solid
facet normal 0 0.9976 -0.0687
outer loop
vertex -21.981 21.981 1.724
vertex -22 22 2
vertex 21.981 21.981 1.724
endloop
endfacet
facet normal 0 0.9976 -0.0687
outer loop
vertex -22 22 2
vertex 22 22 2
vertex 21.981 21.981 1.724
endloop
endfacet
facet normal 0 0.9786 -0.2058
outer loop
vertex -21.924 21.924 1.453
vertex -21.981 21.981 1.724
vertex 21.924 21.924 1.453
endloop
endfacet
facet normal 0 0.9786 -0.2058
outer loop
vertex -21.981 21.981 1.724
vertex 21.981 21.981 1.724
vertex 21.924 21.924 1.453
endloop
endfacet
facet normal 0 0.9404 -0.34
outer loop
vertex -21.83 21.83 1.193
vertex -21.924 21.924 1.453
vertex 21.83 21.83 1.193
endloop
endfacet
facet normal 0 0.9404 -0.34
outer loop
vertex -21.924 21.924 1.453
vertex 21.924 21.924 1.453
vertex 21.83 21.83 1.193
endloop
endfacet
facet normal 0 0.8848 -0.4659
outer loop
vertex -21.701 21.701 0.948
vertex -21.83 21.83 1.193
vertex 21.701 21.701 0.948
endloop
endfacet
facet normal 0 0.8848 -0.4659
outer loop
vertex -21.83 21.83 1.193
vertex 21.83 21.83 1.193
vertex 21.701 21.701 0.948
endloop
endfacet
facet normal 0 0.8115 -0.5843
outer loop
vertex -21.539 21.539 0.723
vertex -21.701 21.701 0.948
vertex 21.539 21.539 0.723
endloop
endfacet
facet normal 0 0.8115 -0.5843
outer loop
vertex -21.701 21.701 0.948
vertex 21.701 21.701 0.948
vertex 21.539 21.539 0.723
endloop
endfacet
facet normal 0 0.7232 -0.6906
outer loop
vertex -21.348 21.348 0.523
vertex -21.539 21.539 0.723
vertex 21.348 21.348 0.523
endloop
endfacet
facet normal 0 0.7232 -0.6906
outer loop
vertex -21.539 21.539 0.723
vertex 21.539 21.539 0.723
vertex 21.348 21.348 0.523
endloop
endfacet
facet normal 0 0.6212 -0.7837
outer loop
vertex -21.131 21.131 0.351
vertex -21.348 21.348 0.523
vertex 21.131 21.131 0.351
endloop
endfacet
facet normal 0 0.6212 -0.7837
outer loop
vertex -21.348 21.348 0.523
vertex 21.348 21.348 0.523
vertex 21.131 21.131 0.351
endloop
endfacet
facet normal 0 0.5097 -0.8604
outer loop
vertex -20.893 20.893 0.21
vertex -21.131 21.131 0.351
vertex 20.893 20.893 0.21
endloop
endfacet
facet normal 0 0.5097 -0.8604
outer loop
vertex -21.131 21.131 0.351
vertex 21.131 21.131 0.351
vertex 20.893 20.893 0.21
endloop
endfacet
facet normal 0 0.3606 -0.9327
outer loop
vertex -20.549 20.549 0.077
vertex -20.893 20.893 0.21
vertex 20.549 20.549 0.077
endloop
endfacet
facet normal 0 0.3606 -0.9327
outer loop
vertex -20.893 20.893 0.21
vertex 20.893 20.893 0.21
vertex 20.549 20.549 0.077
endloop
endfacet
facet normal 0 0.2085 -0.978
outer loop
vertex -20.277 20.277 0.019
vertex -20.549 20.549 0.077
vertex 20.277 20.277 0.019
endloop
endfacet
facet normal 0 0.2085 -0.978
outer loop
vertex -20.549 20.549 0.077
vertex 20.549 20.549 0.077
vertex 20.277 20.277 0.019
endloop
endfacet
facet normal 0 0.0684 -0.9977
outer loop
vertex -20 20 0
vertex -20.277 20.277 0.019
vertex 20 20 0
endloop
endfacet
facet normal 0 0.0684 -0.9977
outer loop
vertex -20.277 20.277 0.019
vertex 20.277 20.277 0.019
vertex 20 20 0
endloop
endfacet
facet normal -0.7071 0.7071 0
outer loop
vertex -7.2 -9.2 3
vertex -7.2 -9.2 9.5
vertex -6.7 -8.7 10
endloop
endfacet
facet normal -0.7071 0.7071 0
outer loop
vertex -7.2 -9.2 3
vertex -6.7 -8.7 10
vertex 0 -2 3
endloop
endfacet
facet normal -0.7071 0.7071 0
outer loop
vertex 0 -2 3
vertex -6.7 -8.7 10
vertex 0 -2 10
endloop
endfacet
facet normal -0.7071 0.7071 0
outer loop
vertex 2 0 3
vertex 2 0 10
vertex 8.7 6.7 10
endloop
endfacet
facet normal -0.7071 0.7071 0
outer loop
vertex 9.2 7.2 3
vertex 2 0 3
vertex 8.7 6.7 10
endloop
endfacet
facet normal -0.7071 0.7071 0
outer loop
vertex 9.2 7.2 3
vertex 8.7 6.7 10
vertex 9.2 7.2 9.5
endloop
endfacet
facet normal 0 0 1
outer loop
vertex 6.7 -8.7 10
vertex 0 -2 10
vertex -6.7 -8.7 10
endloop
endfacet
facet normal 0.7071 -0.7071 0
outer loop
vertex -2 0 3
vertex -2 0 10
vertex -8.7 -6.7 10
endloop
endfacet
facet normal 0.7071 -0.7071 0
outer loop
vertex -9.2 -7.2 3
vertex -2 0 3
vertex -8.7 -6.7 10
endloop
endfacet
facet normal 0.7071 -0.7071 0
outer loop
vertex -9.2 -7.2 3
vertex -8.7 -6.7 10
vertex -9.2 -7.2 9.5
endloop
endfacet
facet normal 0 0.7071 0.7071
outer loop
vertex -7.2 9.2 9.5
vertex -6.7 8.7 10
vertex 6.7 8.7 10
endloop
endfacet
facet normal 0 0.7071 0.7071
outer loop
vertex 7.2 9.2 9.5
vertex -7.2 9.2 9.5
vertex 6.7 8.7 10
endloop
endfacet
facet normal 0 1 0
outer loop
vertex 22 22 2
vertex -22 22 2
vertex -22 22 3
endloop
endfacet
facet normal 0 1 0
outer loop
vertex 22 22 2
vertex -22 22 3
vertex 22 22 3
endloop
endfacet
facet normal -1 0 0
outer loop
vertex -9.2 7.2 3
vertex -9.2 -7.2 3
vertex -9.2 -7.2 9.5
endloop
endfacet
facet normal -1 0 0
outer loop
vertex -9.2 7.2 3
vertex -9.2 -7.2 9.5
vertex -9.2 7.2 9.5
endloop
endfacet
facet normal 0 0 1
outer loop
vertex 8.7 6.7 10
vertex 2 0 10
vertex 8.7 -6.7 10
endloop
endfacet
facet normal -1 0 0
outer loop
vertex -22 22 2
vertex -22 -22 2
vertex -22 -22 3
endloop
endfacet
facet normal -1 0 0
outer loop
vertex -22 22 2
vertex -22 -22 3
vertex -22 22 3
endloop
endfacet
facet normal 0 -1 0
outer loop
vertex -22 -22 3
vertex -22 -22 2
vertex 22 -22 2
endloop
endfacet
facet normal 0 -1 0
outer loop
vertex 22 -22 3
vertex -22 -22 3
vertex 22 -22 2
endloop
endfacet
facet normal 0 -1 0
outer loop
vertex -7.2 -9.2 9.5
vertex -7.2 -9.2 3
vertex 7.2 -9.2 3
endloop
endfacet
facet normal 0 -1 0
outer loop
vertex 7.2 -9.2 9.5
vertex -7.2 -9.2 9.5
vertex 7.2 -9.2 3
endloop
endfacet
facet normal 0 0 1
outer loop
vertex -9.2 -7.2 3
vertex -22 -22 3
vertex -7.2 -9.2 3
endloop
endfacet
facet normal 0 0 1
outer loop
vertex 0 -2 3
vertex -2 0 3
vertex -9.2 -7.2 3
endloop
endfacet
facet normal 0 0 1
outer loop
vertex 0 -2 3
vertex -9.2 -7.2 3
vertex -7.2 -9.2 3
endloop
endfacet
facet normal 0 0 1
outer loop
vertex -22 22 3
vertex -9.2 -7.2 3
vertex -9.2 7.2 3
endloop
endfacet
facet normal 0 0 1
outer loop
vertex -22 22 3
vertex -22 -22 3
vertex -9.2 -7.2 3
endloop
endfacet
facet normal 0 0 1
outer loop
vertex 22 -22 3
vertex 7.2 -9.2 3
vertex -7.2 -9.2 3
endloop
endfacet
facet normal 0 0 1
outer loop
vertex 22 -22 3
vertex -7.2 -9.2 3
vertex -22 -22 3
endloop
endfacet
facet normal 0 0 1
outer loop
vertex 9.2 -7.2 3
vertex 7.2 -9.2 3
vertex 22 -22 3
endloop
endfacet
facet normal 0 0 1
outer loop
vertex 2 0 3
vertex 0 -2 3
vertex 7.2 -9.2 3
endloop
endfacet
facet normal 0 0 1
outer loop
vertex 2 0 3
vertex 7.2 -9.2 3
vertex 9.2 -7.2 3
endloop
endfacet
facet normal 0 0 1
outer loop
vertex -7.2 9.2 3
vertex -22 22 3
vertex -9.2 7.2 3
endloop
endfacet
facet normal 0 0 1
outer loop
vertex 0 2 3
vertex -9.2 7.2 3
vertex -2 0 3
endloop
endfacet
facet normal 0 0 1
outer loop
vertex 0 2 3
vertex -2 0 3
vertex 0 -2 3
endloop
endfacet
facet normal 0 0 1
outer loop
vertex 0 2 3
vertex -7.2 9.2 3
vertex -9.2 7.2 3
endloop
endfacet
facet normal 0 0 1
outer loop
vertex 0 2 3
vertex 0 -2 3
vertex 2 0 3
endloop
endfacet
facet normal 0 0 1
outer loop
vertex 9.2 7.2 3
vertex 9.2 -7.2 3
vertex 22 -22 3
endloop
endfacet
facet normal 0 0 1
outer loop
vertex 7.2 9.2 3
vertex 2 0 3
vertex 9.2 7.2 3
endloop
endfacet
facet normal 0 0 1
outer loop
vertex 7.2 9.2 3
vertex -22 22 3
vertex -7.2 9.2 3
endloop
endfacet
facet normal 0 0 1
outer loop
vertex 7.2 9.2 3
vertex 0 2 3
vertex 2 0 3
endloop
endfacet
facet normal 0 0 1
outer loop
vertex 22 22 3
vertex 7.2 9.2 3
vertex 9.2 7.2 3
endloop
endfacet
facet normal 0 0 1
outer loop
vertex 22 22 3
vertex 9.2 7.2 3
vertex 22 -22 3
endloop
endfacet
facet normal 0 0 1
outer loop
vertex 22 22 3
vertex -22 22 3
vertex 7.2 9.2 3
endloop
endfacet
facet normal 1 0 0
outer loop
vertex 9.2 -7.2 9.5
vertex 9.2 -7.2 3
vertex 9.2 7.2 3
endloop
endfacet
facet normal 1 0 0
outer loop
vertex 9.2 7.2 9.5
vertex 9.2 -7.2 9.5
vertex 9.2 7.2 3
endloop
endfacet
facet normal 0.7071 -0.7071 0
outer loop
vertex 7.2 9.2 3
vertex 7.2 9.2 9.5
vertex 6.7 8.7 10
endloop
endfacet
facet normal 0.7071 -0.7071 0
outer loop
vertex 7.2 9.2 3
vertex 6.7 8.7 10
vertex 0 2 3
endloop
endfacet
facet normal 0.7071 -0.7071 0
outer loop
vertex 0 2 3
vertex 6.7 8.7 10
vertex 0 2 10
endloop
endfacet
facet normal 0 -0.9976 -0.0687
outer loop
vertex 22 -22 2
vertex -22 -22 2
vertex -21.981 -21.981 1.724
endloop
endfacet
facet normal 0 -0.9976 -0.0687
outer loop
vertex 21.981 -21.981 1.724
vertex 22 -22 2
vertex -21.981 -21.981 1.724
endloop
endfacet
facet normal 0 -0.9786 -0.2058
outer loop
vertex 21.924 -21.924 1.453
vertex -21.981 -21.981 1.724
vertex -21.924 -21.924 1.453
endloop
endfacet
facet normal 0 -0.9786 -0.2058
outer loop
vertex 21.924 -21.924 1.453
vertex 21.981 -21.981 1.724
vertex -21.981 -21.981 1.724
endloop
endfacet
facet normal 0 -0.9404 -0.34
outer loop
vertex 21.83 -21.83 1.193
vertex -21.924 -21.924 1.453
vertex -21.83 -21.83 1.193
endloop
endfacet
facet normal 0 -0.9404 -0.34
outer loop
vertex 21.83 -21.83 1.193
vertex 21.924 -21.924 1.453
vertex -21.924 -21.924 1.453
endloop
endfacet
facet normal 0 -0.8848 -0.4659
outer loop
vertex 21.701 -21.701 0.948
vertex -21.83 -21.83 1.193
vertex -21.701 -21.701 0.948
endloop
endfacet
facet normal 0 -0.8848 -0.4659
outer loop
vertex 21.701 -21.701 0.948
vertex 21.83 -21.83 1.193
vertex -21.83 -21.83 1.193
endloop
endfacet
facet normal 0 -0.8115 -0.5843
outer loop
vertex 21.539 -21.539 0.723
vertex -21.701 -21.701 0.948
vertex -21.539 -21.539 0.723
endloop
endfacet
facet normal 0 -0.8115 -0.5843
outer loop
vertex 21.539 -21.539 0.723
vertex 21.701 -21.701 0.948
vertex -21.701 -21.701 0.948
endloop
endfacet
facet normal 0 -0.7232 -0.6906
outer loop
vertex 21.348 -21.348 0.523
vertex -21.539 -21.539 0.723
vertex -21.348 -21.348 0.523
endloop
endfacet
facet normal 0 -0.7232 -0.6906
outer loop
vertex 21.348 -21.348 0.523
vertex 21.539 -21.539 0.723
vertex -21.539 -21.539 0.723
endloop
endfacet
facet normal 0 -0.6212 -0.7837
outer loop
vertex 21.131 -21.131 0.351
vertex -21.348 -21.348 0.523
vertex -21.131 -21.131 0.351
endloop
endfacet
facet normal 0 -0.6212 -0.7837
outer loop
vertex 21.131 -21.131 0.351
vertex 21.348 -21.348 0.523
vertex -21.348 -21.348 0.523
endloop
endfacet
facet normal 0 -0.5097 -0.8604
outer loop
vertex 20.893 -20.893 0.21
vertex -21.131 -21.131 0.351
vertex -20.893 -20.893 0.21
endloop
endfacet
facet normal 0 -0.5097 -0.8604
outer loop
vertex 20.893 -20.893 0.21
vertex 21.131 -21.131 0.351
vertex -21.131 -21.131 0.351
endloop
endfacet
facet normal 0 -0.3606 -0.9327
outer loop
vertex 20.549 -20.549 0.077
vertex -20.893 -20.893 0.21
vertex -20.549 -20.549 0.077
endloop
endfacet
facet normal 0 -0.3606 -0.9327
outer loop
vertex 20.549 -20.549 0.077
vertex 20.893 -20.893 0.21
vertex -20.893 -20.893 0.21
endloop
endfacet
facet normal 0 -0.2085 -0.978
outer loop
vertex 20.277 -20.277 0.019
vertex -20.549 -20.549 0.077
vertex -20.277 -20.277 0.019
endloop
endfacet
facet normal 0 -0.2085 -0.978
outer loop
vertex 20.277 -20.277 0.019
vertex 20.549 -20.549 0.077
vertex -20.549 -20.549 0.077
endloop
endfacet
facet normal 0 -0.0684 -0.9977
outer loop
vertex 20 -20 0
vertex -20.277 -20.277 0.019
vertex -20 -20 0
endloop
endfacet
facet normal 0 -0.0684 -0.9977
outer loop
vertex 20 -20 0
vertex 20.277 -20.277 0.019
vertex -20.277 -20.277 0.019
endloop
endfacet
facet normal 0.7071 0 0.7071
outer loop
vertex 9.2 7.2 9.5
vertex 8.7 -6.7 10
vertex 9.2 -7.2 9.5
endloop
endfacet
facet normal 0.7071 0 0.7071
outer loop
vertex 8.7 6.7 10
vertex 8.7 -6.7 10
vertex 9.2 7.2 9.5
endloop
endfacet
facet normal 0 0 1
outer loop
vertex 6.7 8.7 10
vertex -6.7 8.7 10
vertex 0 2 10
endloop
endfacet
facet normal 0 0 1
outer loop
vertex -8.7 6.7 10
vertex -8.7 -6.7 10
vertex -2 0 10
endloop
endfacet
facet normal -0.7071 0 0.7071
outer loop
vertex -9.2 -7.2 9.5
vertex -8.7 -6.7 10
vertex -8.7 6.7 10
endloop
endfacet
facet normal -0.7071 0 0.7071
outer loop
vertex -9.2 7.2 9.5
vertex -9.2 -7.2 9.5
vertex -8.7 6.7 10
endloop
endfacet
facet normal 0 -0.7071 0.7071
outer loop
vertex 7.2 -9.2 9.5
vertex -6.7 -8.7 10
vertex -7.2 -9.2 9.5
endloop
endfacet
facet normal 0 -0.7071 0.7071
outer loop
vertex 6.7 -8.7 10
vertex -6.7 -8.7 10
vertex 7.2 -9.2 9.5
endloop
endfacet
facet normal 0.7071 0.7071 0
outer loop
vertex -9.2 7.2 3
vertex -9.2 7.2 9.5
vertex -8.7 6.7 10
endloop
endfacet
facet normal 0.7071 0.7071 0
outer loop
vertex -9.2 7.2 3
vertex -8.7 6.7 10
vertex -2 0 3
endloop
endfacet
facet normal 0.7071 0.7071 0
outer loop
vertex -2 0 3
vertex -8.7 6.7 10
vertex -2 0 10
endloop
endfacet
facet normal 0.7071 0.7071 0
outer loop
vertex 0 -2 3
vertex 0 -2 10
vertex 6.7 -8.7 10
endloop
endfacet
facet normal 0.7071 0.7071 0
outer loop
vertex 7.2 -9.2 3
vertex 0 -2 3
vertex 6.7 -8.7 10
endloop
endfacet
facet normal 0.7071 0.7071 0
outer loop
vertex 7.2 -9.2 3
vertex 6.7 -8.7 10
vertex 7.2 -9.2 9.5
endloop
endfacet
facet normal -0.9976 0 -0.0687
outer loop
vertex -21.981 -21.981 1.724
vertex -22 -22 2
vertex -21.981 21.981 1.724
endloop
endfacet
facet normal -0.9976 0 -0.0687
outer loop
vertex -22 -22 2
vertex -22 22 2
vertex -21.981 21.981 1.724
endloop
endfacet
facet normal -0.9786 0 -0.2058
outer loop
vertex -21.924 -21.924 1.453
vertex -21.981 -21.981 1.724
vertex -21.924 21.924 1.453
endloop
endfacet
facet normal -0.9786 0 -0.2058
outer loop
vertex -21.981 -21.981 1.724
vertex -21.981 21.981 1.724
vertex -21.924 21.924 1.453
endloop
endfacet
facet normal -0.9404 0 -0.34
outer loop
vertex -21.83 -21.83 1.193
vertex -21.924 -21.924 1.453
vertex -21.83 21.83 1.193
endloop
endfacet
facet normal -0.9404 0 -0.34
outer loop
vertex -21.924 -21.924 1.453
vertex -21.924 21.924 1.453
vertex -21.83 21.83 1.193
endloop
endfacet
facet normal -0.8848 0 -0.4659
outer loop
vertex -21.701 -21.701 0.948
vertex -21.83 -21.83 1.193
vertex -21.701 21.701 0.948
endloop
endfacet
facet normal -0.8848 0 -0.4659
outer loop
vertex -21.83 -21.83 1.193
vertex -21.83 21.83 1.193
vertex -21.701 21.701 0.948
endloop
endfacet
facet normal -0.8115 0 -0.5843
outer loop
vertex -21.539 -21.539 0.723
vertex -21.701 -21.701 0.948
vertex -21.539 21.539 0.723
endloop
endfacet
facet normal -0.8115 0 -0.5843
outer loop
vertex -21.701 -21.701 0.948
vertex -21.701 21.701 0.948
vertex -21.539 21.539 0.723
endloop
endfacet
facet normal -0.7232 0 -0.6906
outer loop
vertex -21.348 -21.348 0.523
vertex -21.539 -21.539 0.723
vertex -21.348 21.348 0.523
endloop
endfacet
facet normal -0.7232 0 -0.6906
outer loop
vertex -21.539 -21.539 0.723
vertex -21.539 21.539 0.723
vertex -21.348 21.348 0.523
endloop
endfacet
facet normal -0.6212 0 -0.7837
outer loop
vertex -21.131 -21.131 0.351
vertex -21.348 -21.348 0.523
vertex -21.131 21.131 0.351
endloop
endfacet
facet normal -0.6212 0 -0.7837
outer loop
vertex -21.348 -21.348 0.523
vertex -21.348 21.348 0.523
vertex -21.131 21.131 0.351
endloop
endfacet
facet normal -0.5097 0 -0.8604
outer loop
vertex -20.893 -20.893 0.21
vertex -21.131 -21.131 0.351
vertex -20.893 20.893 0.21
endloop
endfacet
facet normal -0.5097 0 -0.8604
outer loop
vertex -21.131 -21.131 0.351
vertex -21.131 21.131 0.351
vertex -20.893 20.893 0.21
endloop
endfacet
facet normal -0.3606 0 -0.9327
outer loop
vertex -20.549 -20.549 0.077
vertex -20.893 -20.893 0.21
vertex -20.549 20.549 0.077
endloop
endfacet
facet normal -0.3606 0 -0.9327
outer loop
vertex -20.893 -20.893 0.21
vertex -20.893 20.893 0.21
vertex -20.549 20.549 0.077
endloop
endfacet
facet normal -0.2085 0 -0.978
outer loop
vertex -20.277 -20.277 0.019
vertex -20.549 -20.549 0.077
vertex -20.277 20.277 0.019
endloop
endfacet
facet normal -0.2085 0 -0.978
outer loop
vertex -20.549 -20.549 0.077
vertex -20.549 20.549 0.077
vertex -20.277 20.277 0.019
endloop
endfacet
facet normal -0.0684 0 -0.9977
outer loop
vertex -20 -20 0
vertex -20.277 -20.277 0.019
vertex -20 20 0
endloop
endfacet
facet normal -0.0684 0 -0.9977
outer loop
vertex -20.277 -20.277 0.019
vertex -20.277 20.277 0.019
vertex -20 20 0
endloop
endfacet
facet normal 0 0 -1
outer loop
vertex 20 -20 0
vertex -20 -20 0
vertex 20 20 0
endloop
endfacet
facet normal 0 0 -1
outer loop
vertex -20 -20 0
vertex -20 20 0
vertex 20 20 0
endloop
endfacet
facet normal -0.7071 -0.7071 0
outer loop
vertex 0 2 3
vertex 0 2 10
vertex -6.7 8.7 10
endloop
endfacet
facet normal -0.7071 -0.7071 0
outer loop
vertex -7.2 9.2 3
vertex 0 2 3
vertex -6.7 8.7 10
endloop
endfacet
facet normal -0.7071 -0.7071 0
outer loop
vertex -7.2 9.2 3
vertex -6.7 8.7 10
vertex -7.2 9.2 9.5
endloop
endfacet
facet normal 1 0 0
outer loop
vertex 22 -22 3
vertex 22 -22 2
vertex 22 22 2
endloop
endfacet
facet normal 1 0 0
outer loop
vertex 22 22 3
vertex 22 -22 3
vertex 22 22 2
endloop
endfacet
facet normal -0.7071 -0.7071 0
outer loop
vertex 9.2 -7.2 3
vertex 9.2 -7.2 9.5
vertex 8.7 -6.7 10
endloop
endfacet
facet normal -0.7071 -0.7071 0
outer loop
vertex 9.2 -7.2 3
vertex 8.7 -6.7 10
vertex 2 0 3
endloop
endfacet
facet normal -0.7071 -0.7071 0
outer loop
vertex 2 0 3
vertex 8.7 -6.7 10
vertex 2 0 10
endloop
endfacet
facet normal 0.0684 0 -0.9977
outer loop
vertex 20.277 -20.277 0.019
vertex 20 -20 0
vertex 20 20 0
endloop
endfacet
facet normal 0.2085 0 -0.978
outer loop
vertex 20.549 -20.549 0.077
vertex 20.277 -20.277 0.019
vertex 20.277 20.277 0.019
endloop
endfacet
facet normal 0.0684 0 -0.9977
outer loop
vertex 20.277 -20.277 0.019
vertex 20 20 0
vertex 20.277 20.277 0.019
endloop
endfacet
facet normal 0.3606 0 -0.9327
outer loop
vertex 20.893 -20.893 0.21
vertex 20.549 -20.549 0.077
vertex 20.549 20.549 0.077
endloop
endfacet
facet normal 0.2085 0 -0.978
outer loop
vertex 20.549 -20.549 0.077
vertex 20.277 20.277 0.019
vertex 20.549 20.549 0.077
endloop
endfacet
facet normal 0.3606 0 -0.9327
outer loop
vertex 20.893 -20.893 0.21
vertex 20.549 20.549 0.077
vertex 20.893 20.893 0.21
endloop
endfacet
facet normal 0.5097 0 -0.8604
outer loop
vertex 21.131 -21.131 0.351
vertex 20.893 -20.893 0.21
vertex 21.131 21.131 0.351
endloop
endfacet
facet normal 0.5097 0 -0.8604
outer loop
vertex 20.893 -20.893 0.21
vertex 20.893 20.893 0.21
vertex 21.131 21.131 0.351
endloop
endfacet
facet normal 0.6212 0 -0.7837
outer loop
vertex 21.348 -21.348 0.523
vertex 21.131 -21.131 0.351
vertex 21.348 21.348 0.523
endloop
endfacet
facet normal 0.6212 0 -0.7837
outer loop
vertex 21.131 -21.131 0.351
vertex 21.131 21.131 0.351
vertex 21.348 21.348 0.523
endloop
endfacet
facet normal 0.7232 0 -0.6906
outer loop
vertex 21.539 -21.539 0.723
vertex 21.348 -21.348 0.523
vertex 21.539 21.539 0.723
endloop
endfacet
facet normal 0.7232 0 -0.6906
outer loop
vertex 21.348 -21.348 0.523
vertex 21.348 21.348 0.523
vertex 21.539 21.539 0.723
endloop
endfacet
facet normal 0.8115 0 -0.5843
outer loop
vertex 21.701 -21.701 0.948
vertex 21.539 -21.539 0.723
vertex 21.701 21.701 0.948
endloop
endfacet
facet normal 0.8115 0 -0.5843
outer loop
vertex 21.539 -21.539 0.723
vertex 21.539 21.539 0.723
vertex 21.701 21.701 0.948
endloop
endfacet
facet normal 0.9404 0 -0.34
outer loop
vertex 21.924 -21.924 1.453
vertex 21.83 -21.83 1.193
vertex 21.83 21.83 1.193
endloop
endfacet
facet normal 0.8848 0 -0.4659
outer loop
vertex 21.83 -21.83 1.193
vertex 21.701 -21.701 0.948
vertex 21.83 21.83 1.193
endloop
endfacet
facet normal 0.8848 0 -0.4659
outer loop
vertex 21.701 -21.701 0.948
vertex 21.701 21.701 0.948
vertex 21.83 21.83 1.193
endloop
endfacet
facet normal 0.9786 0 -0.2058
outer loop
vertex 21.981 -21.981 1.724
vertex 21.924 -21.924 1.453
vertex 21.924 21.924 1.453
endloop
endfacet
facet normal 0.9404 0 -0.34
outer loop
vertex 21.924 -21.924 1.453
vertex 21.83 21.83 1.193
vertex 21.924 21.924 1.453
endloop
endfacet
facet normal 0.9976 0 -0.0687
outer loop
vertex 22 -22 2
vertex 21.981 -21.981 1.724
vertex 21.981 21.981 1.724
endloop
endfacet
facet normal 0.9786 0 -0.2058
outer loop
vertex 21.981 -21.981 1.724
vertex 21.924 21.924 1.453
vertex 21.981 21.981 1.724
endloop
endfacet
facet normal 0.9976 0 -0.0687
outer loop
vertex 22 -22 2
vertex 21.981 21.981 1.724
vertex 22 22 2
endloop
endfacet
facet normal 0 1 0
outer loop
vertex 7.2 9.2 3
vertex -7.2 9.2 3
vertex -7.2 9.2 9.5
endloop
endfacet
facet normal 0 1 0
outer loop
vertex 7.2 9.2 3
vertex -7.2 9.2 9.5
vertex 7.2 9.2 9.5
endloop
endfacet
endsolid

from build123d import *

# Parameters (mm, degrees)
SKETCH_W     = 44
SKETCH_H     = 44
PAD_DEPTH    = 3
SKETCH001_W  = 18.4
SKETCH001_H  = 18.4
PAD001_DEPTH = 7
POCKET_DEPTH = 7
FILLET_R     = 2
CHAMFER_SIZE = 0.5


with BuildPart() as part:
    # Sketch → Pad (new body)
    with BuildSketch(Plane.XY):
        Rectangle(SKETCH_W, SKETCH_H)
    extrude(amount=PAD_DEPTH)

    # Sketch001 (on Face6 of Pad) → Pad001 (join)
    with BuildSketch(Plane.XY.offset(3)):
        Rectangle(SKETCH001_W, SKETCH001_H)
    extrude(amount=PAD001_DEPTH)

    # Sketch002 (on Face11 of Pad001) → Pocket (cut)
    with BuildSketch(Plane.XY.offset(10)):
        Polygon((-9.2, 7.2), (-2, 0), (-9.2, -7.2), (-9.2, -9.2), (-7.2, -9.2), (0, -2), (7.2, -9.2), (9.2, -9.2), (9.2, -7.2), (2, 0), (9.2, 7.2), (9.2, 9.2), (7.2, 9.2), (0, 2), (-7.2, 9.2), (-9.2, 9.2), align=None)
    extrude(amount=-POCKET_DEPTH, mode=Mode.SUBTRACT)

    # Fillet
    fillet_edges = [part.edges().sort_by_distance(p)[0] for p in [
        (0, -22, 0),
        (-22, 0, 0),
        (0, 22, 0),
        (22, 0, 0),
    ]]
    fillet(fillet_edges, radius=FILLET_R)

    # Chamfer
    chamfer_edges = [part.edges().sort_by_distance(p)[0] for p in [
        (0, 9.2, 10),
        (-9.2, 0, 10),
        (0, -9.2, 10),
        (9.2, 0, 10),
    ]]
    chamfer(chamfer_edges, length=CHAMFER_SIZE)


solid = part.part
